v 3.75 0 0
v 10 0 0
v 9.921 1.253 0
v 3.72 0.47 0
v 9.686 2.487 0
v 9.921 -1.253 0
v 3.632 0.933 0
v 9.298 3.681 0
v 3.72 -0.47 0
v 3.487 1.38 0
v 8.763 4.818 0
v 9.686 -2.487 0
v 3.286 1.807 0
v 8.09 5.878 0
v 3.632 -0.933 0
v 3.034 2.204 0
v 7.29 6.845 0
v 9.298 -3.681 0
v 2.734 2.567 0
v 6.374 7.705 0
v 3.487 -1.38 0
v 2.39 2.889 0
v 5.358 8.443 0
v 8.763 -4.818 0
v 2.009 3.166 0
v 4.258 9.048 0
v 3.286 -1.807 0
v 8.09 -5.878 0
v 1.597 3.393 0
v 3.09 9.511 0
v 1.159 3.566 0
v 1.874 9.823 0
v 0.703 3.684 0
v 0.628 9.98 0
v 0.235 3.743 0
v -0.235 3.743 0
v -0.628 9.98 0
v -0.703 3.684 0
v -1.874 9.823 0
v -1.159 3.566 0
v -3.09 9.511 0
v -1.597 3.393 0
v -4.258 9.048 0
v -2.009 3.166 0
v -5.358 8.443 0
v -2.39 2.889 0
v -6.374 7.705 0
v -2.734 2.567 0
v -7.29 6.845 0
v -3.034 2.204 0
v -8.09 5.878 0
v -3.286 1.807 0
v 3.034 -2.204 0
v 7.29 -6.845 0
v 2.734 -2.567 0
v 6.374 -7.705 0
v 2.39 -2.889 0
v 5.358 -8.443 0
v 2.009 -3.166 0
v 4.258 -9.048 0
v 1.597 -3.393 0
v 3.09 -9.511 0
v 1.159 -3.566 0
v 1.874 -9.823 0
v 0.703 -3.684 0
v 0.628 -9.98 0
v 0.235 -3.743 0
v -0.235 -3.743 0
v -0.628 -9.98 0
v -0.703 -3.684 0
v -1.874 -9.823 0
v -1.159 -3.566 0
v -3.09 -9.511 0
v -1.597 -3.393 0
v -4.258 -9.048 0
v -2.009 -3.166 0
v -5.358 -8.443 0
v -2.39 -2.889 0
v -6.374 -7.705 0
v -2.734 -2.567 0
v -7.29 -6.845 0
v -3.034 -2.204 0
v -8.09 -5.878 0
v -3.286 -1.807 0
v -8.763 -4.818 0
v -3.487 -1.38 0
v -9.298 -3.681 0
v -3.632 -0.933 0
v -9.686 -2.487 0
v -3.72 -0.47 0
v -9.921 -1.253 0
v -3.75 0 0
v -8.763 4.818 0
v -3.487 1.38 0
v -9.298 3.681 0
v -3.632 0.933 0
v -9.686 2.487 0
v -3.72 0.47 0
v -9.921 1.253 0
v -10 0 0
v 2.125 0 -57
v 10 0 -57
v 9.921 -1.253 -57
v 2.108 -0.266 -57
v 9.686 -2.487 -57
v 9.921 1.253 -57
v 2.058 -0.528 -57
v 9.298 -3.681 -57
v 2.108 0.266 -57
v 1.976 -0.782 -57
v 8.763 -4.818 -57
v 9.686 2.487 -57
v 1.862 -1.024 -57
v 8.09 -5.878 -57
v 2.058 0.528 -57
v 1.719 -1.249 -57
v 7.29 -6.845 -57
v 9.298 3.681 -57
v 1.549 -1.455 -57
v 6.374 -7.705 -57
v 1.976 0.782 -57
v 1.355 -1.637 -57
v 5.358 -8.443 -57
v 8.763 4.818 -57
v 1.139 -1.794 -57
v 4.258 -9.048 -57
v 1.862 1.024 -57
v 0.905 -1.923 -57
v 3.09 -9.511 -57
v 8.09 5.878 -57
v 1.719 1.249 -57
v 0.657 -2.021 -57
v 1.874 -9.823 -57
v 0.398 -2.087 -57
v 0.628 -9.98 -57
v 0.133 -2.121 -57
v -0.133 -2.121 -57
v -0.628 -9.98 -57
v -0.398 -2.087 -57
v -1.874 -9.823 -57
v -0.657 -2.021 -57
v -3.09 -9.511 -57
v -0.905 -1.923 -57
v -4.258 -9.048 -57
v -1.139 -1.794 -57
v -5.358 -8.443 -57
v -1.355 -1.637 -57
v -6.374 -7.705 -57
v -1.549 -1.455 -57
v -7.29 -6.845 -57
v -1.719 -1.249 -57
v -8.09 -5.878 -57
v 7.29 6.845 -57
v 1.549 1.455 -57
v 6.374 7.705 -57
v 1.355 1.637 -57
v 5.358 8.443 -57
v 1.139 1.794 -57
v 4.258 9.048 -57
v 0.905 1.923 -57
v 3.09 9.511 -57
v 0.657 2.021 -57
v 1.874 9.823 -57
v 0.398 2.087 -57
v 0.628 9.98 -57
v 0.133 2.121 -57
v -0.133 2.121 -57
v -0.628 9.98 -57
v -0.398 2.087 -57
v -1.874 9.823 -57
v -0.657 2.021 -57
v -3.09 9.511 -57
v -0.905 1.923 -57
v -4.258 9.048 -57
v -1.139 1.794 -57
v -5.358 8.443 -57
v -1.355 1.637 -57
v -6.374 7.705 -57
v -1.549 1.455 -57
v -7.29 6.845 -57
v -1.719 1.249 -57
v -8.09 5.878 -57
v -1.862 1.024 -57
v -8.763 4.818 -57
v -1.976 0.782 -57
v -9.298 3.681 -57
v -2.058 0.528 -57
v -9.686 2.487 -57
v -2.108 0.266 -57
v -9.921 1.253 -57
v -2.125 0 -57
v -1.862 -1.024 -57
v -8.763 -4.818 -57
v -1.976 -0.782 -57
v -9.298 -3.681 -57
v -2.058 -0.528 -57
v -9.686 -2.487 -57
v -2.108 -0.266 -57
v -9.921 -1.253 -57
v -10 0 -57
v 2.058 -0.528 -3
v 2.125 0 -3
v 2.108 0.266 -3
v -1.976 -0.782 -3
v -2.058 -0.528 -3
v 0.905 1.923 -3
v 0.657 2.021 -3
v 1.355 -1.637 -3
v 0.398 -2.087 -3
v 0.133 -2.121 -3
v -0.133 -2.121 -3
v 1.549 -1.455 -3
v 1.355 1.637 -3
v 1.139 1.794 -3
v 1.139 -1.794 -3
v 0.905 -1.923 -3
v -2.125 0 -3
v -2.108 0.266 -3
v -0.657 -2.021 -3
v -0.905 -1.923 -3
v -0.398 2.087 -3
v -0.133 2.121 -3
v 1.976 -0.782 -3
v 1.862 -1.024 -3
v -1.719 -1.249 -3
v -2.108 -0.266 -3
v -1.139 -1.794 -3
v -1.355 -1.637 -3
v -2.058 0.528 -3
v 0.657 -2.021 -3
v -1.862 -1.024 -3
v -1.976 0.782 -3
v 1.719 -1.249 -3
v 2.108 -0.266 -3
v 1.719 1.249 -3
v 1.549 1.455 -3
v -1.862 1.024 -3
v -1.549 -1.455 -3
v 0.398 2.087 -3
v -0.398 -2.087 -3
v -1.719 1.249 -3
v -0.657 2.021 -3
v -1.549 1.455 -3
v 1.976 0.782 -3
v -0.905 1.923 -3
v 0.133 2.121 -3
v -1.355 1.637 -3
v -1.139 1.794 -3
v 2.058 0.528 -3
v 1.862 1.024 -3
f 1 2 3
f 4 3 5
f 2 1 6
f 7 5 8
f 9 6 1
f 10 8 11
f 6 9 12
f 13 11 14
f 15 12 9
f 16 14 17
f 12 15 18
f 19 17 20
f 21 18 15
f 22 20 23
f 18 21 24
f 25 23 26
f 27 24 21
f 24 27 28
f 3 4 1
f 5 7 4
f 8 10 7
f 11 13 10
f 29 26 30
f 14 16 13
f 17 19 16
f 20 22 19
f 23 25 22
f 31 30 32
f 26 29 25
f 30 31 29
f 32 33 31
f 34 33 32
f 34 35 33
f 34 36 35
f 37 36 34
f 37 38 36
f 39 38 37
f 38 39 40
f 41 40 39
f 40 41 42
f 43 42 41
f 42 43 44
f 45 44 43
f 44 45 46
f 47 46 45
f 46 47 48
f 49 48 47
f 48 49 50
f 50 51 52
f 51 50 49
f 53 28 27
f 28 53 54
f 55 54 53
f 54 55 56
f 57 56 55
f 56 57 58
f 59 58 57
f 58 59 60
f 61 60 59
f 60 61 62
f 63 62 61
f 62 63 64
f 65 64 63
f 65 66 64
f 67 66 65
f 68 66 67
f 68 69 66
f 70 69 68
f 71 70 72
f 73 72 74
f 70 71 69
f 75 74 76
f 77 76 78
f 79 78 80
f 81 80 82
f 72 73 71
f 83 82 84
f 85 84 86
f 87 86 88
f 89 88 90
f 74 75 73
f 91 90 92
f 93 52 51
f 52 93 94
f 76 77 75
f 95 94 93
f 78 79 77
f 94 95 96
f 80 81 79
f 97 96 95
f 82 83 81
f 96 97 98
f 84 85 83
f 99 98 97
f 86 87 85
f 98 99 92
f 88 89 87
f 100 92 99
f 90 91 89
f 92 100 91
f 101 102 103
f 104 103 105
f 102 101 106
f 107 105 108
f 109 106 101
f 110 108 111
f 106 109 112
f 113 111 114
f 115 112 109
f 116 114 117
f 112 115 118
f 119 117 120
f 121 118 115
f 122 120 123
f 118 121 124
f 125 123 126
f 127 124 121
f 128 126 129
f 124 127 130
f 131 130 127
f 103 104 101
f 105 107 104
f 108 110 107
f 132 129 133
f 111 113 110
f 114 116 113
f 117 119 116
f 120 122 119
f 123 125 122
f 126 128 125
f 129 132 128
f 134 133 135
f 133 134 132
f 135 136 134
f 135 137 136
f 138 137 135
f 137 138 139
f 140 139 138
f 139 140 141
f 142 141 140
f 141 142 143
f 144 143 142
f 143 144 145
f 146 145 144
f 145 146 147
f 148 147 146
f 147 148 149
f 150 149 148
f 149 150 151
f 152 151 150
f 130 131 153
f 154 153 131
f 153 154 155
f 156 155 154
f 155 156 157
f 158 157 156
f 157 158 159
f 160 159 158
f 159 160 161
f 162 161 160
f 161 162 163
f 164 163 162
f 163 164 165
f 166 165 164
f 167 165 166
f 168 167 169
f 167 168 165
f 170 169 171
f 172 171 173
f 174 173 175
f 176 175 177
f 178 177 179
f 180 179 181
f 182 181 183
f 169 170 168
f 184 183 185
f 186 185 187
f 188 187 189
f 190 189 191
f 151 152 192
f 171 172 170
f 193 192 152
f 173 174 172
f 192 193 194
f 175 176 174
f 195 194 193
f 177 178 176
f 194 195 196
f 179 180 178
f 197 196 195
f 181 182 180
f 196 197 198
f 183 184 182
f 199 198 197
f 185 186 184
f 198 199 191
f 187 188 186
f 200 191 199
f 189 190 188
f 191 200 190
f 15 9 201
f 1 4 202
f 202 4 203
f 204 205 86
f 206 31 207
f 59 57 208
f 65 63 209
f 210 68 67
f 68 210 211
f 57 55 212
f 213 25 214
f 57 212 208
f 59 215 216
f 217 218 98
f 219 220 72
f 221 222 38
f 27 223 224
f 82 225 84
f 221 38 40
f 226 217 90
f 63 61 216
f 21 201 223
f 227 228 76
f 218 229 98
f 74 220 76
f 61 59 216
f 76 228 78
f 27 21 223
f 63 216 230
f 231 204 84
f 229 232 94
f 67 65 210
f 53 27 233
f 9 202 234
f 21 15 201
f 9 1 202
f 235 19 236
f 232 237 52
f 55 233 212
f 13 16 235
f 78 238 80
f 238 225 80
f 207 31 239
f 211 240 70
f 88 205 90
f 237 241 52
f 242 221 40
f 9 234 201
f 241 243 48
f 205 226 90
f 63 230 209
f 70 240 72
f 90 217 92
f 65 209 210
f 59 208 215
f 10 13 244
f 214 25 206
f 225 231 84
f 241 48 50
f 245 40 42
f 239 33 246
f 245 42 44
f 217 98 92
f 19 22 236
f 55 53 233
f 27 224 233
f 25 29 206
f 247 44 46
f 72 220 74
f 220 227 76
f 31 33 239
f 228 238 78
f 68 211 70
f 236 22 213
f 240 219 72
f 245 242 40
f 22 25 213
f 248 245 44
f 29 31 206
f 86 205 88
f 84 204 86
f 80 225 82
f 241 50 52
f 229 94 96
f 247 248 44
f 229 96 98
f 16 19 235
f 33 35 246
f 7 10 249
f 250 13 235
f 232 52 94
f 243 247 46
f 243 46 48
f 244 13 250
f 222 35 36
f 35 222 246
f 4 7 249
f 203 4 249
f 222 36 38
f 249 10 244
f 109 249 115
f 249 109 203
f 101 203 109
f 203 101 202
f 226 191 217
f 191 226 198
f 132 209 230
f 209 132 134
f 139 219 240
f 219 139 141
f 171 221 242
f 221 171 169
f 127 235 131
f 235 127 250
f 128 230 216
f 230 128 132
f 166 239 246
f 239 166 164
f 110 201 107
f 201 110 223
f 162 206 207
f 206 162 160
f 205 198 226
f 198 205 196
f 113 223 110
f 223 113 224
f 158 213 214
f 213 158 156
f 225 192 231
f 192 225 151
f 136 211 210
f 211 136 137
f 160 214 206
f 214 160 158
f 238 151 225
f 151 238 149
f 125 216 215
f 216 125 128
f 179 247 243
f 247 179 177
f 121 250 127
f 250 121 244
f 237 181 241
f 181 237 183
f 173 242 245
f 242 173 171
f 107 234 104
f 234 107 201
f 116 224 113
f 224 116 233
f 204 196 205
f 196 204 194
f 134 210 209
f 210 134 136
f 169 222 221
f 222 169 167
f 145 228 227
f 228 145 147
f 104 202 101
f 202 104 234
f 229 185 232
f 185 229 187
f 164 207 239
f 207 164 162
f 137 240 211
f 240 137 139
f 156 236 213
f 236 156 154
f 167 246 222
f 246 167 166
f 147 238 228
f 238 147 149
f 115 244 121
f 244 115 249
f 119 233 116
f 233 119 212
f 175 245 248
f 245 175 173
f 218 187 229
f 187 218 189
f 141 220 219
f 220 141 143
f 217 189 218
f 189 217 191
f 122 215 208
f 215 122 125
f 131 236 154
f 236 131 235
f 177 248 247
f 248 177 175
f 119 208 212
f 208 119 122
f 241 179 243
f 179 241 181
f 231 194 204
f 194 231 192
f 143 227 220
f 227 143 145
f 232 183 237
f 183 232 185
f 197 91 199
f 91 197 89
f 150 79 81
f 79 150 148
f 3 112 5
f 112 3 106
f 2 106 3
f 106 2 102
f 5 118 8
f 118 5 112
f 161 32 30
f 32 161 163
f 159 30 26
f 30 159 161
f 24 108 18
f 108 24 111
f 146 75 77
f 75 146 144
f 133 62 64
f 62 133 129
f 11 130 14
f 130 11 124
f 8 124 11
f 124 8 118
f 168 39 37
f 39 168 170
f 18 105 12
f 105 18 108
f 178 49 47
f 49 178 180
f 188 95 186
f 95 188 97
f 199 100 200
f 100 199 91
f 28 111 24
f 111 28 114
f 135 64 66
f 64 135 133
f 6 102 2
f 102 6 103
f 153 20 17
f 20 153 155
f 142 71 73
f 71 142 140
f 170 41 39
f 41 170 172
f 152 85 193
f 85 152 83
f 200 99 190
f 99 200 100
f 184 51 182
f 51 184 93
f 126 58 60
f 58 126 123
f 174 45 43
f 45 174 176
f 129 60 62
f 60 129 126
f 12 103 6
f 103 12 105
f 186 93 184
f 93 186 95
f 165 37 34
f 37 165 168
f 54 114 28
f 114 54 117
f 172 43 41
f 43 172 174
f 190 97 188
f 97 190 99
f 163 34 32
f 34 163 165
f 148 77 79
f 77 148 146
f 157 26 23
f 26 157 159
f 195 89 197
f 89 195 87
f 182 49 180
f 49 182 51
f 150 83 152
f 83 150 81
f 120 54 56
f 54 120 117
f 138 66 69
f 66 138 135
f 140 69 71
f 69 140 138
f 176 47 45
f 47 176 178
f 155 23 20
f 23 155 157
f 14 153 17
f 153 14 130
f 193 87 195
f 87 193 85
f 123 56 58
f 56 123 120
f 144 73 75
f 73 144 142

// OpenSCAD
$fn = 50;


difference() {
	union() {
		translate(v = [0, 0, -57.0000000000]) {
			cylinder(h = 57, r = 10.0000000000);
		}
	}
	union() {
		translate(v = [0, 0, 0]) {
			rotate(a = [0, 0, 0]) {
				difference() {
					union() {
						#translate(v = [0, 0, -57.0000000000]) {
							cylinder(h = 57, r = 2.0000000000);
						}
						#translate(v = [0, 0, -3]) {
							cylinder(h = 3, r1 = 2.1250000000, r2 = 3.7500000000);
						}
						#translate(v = [0, 0, -57.0000000000]) {
							cylinder(h = 57, r = 2.1250000000);
						}
						#translate(v = [0, 0, -57.0000000000]) {
							cylinder(h = 57, r = 2.0000000000);
						}
					}
					union();
				}
			}
		}
	}
}
